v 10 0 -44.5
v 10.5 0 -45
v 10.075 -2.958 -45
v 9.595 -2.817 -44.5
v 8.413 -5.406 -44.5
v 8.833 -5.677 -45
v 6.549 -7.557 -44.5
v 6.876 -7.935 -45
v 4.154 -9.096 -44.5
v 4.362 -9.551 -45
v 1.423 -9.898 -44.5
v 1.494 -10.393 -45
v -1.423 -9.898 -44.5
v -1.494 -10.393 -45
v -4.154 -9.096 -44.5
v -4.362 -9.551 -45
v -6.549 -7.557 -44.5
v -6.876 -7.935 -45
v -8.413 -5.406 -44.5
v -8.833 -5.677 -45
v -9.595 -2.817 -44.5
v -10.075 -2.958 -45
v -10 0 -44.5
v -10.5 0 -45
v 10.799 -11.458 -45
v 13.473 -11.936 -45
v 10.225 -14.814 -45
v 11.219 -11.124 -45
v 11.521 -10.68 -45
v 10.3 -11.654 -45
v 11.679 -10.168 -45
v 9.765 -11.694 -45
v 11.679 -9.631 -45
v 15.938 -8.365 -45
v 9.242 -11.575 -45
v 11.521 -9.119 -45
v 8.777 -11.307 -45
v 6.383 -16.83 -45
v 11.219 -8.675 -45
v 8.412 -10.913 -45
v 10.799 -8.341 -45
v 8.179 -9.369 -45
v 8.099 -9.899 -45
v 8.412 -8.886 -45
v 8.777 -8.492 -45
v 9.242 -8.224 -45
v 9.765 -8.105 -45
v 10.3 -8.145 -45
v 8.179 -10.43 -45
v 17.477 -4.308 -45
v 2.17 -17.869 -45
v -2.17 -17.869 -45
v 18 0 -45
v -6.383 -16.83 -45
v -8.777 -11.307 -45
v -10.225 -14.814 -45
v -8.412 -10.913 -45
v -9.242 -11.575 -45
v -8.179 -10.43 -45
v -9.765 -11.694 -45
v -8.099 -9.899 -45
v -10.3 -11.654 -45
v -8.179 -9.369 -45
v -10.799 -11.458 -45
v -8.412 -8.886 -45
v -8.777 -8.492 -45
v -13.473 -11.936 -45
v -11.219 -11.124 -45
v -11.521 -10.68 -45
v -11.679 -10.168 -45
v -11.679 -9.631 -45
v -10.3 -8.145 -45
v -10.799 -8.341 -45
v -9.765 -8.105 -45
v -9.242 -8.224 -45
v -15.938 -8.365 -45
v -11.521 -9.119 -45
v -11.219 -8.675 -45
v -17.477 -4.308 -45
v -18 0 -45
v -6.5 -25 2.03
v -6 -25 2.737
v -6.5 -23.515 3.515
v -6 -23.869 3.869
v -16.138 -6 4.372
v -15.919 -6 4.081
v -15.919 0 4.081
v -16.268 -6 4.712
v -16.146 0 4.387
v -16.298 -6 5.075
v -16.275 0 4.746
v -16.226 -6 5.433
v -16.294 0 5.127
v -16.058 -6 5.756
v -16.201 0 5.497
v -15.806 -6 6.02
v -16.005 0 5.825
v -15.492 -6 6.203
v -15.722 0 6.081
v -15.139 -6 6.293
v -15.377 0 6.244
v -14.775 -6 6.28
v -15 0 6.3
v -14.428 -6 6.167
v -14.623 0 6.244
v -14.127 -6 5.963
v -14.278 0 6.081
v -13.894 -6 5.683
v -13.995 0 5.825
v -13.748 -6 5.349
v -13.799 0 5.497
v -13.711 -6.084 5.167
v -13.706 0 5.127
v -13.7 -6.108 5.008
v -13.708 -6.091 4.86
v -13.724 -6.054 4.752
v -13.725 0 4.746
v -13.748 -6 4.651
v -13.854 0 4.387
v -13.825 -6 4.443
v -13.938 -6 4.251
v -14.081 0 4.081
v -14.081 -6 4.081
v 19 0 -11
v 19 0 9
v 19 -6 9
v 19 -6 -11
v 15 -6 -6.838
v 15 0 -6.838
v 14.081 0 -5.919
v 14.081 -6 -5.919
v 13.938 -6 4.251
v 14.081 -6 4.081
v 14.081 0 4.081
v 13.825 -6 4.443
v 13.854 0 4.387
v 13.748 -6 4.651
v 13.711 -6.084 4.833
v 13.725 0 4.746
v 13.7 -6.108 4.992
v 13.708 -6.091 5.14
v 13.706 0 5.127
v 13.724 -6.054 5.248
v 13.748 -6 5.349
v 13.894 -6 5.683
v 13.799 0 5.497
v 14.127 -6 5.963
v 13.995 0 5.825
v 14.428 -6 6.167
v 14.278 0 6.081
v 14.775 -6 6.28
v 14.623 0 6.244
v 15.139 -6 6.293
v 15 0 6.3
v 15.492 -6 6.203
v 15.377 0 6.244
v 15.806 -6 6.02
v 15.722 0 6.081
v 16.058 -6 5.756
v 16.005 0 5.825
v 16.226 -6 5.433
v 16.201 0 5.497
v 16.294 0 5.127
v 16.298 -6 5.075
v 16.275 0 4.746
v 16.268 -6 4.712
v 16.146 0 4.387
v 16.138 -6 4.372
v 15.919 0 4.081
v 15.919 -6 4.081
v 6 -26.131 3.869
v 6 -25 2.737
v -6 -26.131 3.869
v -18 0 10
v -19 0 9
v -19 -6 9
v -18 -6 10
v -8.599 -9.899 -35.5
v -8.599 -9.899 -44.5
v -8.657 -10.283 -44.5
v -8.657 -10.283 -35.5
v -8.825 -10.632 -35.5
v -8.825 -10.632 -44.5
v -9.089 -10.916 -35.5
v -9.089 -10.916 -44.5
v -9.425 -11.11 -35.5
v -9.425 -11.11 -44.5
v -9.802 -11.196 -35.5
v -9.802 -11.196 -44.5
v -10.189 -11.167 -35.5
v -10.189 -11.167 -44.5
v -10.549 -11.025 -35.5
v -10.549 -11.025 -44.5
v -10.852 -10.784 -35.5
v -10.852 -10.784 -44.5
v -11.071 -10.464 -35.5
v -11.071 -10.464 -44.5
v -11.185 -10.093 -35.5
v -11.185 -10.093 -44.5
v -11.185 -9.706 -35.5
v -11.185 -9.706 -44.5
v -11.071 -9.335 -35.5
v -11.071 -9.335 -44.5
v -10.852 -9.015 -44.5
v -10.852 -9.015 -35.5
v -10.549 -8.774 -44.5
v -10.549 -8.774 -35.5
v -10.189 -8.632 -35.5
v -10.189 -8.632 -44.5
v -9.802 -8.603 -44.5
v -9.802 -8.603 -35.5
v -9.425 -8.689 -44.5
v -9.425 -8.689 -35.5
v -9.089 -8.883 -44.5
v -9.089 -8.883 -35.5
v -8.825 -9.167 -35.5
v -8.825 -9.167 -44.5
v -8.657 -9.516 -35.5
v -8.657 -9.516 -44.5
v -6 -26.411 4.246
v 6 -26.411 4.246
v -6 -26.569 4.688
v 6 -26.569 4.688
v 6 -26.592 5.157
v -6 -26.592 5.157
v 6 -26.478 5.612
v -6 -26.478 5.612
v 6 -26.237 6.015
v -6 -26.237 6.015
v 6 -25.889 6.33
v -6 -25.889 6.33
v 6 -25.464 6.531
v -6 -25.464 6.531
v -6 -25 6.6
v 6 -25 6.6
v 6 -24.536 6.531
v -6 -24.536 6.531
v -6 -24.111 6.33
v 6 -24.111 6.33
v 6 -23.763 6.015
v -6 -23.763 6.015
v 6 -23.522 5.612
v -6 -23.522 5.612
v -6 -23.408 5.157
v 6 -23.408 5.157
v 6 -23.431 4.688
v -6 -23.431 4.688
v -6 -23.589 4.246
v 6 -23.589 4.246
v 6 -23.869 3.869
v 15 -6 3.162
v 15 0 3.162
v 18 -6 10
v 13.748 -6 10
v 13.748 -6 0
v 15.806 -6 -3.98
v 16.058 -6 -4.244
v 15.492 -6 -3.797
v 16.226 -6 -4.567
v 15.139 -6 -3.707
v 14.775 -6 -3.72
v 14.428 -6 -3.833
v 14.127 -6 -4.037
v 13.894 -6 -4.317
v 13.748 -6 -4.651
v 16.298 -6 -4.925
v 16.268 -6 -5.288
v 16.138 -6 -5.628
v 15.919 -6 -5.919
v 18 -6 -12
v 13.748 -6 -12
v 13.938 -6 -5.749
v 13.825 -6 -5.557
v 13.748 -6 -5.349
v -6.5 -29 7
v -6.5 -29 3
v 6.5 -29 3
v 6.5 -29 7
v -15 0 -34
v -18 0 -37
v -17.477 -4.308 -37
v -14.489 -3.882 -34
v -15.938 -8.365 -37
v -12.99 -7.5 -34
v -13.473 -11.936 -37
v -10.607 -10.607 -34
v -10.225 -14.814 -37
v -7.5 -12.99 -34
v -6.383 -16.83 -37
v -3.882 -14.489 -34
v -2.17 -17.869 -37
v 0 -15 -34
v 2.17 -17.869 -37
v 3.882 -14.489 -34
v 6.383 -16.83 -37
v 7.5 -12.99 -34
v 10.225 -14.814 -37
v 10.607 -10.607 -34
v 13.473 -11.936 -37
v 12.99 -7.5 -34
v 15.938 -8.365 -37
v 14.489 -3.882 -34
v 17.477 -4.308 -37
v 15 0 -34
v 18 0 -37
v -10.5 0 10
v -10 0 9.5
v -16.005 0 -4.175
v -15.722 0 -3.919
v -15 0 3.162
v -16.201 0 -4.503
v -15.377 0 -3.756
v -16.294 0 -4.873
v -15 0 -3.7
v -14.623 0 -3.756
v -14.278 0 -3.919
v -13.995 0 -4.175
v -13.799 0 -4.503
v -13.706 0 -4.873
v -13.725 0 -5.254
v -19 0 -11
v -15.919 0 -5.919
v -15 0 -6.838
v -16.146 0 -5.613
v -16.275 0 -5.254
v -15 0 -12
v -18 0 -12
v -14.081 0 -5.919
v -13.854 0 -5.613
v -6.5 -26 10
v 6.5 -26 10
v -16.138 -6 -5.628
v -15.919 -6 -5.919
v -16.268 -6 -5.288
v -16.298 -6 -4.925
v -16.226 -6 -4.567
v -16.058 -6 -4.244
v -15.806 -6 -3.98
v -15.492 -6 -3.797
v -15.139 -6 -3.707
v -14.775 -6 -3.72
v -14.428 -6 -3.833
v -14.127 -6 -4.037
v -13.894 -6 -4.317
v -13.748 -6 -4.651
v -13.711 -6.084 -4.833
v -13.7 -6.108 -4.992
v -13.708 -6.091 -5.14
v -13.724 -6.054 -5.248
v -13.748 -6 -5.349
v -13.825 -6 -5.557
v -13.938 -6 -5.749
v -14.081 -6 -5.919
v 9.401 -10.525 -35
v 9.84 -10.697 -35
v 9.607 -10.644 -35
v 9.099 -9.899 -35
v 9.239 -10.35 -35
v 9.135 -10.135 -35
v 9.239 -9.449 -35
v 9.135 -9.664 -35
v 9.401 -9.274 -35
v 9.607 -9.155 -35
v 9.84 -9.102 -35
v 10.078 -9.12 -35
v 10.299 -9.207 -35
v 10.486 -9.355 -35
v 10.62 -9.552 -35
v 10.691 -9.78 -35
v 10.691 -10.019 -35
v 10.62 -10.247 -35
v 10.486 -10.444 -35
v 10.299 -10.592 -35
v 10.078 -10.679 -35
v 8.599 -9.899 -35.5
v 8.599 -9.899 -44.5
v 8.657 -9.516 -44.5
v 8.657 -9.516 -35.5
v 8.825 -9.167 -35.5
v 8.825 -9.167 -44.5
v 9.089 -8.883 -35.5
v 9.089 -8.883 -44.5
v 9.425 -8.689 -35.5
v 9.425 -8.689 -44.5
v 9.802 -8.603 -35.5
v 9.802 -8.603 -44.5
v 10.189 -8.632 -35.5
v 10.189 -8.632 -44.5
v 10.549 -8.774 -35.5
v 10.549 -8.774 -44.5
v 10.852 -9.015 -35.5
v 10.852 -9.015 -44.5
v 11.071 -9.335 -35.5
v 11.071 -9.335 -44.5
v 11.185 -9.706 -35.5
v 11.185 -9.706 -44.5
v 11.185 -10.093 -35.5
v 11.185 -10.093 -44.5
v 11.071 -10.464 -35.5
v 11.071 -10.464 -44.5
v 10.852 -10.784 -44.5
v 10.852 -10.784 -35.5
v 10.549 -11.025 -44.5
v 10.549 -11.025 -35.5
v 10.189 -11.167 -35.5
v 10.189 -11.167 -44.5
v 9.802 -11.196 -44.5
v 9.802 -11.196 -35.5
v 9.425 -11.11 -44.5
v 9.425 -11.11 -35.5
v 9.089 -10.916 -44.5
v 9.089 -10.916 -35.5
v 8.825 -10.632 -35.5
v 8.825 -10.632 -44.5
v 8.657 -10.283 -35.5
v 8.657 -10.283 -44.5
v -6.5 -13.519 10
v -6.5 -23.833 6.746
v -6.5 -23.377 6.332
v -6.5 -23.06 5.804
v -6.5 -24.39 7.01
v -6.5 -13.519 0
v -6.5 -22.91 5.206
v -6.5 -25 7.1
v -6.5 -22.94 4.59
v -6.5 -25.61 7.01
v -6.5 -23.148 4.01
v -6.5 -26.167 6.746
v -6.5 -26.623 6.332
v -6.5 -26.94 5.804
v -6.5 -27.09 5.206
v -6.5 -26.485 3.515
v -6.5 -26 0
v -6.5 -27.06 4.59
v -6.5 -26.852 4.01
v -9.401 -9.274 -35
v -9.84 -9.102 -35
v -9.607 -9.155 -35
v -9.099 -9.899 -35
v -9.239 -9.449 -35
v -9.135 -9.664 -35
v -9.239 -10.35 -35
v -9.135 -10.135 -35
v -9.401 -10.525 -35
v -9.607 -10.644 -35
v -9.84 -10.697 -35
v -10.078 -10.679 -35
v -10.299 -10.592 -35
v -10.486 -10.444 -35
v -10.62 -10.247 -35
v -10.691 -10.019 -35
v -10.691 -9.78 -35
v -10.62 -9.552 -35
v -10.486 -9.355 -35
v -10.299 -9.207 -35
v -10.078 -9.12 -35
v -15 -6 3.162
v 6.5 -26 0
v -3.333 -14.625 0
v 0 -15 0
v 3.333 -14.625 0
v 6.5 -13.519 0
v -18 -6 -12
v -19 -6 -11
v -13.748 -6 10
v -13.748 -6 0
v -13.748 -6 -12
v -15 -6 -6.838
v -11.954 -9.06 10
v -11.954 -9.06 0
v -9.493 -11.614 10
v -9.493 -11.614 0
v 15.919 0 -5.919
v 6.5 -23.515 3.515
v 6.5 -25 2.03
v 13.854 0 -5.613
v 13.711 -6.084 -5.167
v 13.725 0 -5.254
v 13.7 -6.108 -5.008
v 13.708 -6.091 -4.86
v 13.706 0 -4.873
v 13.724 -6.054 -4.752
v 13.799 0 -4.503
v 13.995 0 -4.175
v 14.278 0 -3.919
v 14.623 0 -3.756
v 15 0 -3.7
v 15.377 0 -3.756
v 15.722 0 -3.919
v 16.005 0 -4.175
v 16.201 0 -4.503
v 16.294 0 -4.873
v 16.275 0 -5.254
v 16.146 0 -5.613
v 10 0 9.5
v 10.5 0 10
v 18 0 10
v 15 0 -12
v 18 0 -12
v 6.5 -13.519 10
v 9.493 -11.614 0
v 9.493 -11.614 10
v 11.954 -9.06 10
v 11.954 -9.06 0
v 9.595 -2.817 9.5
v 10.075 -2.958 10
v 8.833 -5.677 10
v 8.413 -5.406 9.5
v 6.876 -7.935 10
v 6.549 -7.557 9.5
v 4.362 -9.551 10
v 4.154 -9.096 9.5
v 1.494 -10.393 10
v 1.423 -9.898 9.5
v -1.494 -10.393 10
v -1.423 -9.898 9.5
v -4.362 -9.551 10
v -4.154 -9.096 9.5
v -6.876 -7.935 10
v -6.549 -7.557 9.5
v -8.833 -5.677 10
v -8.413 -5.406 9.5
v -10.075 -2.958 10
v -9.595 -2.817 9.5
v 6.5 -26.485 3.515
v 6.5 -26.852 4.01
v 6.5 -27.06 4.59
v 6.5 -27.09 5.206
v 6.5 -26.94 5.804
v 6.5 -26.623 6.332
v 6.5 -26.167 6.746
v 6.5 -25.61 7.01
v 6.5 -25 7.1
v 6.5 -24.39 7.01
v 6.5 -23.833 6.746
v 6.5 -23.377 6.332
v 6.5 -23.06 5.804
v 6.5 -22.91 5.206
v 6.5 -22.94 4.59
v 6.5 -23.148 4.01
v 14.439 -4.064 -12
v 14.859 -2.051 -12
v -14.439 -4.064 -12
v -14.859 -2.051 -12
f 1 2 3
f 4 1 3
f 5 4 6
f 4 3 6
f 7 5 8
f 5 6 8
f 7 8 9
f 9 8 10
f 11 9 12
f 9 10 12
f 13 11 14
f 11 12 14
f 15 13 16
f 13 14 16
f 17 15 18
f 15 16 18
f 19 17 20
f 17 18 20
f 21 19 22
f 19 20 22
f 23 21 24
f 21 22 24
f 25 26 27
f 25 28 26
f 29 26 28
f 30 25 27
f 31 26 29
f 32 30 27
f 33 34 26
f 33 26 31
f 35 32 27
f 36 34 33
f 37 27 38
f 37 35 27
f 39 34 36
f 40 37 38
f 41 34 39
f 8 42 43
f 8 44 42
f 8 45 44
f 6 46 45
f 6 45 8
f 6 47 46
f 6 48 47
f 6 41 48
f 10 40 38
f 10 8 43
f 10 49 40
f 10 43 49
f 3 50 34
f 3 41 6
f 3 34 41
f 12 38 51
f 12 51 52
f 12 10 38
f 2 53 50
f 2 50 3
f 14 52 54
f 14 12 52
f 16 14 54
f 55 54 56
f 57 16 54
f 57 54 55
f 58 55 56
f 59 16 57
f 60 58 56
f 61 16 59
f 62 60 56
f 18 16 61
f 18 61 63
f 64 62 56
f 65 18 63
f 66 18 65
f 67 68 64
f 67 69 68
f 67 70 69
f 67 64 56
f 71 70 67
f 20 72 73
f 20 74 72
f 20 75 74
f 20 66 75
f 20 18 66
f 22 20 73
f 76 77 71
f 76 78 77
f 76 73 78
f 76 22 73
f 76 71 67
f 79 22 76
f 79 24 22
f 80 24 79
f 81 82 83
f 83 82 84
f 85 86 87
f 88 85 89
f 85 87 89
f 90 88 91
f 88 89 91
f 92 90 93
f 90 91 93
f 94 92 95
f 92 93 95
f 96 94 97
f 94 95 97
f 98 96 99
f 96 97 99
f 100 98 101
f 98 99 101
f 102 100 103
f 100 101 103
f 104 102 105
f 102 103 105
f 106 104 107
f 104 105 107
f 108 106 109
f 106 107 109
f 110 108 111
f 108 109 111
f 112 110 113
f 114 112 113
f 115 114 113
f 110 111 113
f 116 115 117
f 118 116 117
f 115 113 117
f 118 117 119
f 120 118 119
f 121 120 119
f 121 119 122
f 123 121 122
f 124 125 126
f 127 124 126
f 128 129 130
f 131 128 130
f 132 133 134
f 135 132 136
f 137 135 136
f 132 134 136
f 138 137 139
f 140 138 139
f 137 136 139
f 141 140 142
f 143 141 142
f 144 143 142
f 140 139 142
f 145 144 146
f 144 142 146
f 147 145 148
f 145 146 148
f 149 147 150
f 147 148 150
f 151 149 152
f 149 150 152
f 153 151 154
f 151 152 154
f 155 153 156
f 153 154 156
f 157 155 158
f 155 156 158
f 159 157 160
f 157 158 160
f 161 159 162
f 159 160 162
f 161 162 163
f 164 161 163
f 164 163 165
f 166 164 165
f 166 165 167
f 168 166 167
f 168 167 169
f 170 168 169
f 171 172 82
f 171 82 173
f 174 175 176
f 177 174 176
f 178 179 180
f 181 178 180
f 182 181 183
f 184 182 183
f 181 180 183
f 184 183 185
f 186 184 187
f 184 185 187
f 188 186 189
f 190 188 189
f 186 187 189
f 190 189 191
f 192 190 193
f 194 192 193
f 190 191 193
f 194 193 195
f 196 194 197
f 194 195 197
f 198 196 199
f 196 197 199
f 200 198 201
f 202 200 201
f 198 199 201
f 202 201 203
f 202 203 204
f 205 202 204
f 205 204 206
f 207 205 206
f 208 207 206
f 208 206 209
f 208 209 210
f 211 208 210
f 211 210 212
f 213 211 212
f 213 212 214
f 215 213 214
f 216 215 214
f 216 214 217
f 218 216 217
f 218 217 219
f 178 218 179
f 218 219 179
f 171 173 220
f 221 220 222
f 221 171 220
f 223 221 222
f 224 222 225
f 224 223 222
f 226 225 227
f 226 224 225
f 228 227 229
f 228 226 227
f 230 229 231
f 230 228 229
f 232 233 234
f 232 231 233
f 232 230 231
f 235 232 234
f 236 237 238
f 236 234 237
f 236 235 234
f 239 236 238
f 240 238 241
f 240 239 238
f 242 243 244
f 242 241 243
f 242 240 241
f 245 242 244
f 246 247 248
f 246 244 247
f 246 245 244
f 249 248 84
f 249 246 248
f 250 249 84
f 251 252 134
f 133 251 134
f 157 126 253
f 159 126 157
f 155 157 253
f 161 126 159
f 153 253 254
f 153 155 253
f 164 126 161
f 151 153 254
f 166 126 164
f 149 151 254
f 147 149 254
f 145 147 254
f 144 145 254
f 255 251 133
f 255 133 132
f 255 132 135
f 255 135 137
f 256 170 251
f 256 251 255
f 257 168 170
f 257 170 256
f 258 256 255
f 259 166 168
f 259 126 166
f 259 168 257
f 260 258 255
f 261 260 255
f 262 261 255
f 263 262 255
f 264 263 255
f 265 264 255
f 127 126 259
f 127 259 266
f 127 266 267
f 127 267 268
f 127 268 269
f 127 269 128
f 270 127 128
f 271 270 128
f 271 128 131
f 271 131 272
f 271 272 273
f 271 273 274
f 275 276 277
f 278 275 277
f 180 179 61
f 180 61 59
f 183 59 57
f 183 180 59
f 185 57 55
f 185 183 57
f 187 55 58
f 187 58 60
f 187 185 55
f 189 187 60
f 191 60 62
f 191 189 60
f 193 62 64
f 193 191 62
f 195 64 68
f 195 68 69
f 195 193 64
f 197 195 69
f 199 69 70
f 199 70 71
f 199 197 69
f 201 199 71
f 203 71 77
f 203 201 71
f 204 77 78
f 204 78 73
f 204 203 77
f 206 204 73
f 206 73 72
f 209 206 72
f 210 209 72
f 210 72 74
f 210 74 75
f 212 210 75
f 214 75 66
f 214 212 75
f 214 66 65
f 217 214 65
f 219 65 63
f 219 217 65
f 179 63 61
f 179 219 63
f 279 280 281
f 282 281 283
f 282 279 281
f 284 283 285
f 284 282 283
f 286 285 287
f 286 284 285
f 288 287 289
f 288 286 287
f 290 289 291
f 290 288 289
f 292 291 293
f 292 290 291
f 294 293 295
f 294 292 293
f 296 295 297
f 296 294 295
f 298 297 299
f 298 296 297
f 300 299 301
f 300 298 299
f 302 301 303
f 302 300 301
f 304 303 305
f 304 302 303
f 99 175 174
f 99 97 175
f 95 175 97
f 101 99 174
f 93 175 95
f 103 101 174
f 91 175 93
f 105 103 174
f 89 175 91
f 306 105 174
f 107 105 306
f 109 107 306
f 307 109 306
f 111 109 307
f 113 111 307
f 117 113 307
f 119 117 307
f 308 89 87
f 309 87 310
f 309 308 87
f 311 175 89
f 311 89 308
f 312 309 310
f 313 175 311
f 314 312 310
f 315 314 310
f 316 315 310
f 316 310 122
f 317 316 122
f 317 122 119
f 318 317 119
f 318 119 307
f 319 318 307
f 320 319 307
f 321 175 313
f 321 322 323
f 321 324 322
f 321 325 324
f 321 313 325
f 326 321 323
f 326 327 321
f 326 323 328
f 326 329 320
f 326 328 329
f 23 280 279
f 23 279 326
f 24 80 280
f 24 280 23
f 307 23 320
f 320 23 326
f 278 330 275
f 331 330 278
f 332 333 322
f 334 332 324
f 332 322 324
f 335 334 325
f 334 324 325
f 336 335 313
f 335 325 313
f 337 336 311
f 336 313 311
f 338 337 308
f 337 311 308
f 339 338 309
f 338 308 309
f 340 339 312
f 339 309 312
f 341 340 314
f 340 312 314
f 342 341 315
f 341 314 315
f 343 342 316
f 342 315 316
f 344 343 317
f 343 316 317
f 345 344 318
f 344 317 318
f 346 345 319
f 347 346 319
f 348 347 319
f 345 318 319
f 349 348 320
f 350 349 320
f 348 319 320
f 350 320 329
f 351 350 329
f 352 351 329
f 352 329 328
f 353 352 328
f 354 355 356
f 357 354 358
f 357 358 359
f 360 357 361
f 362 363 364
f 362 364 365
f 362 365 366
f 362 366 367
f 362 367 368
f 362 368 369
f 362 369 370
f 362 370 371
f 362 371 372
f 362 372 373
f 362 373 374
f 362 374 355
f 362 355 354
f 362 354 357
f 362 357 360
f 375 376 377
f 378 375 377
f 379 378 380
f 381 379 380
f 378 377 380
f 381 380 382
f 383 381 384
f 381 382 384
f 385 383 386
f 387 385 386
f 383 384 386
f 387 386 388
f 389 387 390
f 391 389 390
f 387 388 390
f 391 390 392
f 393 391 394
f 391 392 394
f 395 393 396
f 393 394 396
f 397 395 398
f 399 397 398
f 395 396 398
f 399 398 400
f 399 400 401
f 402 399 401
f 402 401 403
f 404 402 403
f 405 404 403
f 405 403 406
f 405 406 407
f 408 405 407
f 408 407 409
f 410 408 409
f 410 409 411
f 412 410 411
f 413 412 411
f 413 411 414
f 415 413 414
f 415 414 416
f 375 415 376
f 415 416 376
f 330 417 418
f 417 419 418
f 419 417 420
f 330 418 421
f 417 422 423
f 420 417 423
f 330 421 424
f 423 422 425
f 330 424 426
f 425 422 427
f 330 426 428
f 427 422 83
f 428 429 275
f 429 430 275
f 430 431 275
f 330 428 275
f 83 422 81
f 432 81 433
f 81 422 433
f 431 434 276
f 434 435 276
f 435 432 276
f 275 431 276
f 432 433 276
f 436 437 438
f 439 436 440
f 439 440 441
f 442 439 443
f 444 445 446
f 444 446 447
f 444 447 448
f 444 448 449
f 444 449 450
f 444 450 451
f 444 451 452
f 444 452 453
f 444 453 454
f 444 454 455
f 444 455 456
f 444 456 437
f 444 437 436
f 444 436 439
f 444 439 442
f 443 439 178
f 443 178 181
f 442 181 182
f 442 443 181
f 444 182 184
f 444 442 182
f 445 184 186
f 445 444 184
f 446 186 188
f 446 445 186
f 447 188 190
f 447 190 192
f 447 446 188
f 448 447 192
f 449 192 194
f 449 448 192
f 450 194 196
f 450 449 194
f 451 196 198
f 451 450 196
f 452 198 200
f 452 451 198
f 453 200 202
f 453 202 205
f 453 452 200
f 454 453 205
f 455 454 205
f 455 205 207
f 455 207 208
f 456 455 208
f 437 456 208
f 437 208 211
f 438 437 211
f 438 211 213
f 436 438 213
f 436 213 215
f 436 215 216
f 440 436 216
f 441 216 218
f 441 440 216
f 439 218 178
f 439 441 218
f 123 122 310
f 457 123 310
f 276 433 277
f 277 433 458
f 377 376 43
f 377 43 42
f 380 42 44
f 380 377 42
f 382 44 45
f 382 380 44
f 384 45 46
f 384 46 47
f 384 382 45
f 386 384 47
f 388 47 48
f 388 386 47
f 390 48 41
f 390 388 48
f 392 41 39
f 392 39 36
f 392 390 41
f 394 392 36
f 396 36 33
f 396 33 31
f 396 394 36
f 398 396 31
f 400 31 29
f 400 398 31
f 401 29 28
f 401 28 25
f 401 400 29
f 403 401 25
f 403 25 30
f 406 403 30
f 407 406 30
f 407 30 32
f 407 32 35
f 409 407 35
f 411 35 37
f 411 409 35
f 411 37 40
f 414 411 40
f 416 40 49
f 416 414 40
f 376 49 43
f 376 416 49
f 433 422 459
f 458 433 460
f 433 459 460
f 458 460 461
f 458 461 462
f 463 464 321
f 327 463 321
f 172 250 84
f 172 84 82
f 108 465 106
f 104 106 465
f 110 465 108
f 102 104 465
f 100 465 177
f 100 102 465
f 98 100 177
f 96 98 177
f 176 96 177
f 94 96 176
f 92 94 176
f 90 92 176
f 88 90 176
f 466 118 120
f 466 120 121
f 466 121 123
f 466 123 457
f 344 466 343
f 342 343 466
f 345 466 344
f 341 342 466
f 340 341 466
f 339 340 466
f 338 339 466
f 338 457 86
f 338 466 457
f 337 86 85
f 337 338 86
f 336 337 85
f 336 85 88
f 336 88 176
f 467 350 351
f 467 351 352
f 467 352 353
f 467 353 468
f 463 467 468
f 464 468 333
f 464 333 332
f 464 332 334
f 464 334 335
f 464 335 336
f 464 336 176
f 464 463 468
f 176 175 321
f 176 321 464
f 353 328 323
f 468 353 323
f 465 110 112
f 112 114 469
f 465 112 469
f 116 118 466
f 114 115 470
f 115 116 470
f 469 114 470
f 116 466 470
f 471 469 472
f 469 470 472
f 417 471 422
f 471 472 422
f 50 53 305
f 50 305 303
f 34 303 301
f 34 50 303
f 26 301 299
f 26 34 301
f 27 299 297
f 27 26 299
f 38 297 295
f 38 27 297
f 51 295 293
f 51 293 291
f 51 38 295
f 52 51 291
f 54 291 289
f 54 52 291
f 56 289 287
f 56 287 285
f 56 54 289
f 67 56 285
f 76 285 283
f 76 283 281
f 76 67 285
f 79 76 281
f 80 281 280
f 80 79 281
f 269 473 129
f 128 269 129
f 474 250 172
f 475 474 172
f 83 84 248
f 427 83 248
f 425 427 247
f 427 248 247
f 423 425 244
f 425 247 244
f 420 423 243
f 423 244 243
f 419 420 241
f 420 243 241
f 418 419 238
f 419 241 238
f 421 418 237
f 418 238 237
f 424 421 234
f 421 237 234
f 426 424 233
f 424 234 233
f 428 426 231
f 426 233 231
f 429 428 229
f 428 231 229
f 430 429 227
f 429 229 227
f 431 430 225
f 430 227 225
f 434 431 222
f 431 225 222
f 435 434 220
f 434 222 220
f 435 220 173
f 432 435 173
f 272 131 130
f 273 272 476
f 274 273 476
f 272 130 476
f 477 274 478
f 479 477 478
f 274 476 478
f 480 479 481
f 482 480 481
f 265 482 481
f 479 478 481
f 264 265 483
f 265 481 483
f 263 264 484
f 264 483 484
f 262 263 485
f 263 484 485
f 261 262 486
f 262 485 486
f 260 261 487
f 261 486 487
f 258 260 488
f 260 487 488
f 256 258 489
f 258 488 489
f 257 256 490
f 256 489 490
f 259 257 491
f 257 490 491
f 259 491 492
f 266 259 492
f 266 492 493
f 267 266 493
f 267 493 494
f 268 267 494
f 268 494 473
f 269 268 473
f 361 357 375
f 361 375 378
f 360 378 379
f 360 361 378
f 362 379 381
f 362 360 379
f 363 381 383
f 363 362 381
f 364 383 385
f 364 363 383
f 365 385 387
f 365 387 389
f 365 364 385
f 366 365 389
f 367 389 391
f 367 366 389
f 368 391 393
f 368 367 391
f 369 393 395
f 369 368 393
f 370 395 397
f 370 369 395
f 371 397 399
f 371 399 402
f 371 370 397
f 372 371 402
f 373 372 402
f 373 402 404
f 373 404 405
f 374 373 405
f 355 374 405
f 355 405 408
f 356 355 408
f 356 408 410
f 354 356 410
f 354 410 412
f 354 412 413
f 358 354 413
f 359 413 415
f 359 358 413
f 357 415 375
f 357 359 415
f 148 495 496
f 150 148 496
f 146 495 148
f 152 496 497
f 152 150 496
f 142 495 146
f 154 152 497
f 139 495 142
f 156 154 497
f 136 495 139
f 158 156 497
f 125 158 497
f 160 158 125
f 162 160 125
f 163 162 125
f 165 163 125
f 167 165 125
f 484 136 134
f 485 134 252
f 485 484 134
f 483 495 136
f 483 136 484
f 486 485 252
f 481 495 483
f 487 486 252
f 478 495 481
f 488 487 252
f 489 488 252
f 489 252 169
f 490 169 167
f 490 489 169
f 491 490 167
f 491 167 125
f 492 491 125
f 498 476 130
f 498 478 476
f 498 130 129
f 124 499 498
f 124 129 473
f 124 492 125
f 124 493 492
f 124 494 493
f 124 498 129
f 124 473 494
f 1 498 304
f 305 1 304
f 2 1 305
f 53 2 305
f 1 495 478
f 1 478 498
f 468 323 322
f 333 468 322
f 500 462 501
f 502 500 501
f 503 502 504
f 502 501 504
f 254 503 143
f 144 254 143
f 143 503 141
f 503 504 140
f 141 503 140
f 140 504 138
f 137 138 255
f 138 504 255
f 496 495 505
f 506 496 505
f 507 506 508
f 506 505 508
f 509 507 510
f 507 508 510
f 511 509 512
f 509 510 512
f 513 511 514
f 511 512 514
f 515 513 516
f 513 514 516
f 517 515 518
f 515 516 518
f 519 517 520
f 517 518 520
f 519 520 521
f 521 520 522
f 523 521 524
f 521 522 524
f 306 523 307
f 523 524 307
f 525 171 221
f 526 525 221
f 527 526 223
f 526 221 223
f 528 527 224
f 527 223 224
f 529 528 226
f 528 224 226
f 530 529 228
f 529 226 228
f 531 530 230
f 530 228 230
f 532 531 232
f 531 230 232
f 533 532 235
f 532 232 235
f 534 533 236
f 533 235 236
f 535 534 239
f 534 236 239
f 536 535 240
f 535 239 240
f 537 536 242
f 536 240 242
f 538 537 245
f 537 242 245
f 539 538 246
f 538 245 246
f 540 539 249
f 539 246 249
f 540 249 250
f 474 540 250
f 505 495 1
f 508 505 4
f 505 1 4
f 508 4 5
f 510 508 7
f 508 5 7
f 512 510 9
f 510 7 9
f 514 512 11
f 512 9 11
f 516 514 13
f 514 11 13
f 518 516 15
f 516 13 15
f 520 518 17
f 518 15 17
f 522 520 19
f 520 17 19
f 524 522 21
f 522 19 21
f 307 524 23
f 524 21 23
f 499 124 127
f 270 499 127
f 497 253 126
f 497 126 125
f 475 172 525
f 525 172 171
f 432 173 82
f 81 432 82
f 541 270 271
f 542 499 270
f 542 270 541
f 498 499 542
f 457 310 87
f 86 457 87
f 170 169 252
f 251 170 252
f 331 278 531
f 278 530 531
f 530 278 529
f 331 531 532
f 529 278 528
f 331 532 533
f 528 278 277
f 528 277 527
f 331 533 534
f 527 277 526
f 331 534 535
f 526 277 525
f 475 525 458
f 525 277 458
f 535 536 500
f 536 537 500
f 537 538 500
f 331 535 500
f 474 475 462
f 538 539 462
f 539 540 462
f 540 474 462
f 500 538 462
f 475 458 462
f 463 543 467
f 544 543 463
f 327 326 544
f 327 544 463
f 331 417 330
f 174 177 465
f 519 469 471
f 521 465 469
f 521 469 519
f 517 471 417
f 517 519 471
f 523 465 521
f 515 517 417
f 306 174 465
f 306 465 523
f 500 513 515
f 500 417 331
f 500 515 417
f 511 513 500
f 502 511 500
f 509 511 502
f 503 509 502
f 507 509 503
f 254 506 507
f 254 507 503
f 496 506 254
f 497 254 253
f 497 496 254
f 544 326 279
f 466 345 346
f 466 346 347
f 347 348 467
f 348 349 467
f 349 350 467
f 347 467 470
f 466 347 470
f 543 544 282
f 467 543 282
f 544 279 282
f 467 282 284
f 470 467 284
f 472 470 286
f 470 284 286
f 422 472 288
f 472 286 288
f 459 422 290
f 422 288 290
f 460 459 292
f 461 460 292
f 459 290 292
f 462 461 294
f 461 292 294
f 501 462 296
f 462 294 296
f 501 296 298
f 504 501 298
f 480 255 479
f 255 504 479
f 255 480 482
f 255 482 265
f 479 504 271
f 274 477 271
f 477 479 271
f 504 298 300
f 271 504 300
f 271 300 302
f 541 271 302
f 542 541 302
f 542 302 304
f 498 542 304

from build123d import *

# Parameters (mm, degrees)
EXTRUDE_1_DEPTH     = 10
CUT_EXTRUDE_1_DEPTH = 54
CUT_EXTRUDE_2_DEPTH = 54
EXTRUDE_START       = 45
EXTRUDE_2_DEPTH     = 45
CHAMFER_1_SIZE      = 3
EXTRUDE_START_2     = 12
EXTRUDE_3_DEPTH     = 12
CUT_EXTRUDE_4_DEPTH = 12
EXTRUDE_4_DEPTH     = 8
CHAMFER_7_SIZE      = 3
SKETCH_7_R          = 1.3
CUT_EXTRUDE_3_DEPTH = 10
CHAMFER_4_SIZE      = 1
CHAMFER_5_SIZE      = 0.5
CHAMFER_6_SIZE      = 0.5


with BuildPart() as part:
    # 草图1 → 凸台-拉伸1 (new body)
    with BuildSketch(Plane.XY):
        with BuildLine():
            Line((-10, 0), (-19, 0))
            Line((-19, 0), (-19, -6))
            Line((-19, -6), (-13.747727085, -6))
            ThreePointArc((-13.747727085, -6), (-10.799286806, -10.410350834), (-6.5, -13.518505835))
            Line((-6.5, -13.518505835), (-6.5, -29))
            Line((-6.5, -29), (6.5, -29))
            Line((6.5, -29), (6.5, -13.518505835))
            ThreePointArc((6.5, -13.518505835), (10.799286806, -10.410350834), (13.747727085, -6))
            Line((13.747727085, -6), (19, -6))
            Line((19, -6), (19, 0))
            Line((19, 0), (10, 0))
            ThreePointArc((10, 0), (0, -10), (-10, 0))
        make_face()
    extrude(amount=EXTRUDE_1_DEPTH)

    # 草图3 → 切除-拉伸1 (cut)
    with BuildSketch(Plane(origin=(6.5, 0, 0), x_dir=(0, 0, -1), z_dir=(1, 0, 0))):
        with BuildLine():
            Line((-3.86862915, -23.86862915), (-2.7372583, -25))
            Line((-2.7372583, -25), (-3.86862915, -26.13137085))
            ThreePointArc((-3.86862915, -26.13137085), (-6.6, -25), (-3.86862915, -23.86862915))
        make_face()
    extrude(amount=-CUT_EXTRUDE_1_DEPTH, mode=Mode.SUBTRACT)

    # 草图4 → 切除-拉伸2 (cut)
    with BuildSketch(Plane(origin=(0, 0, 0), x_dir=(1, 0, 0), z_dir=(0, 1, 0))):
        with BuildLine():
            Line((-15, -3.161522369), (-15.919238816, -4.080761184))
            ThreePointArc((-15.919238816, -4.080761184), (-15, -6.3), (-14.080761184, -4.080761184))
            Line((-14.080761184, -4.080761184), (-15, -3.161522369))
        make_face()
        with BuildLine():
            Line((15, -3.161522369), (14.080761184, -4.080761184))
            ThreePointArc((14.080761184, -4.080761184), (15, -6.3), (15.919238816, -4.080761184))
            Line((15.919238816, -4.080761184), (15, -3.161522369))
        make_face()
    extrude(amount=-CUT_EXTRUDE_2_DEPTH, mode=Mode.SUBTRACT)

    # 草图5 → 凸台-拉伸2 (add)
    with BuildSketch(Plane(origin=(0, 0, 0), x_dir=(-1, 0, 0), z_dir=(0, 0, -1)).offset(EXTRUDE_START)):
        with BuildLine():
            Line((10, 0), (15, 0))
            ThreePointArc((15, 0), (0, -15), (-15, 0))
            Line((-15, 0), (-10, 0))
            ThreePointArc((-10, 0), (0, -10), (10, 0))
        make_face()
    extrude(amount=-EXTRUDE_2_DEPTH)

    # 倒角1
    chamfer_1_edges = [part.edges().sort_by_distance(p)[0] for p in [
        (0, -29, 0),
        (0, -29, 10),
    ]]
    chamfer(chamfer_1_edges, length=CHAMFER_1_SIZE)

    # 草图8 → 凸台-拉伸3 (add)
    with BuildSketch(Plane(origin=(0, 0, 0), x_dir=(-1, 0, 0), z_dir=(0, 0, -1)).offset(EXTRUDE_START_2)):
        with BuildLine():
            Line((-15, 0), (-19, 0))
            Line((-19, 0), (-19, -6))
            Line((-19, -6), (-13.747727085, -6))
            ThreePointArc((-13.747727085, -6), (-14.683594694, -3.064644655), (-15, 0))
        make_face()
        with BuildLine():
            Line((13.747727085, -6), (19, -6))
            Line((19, -6), (19, 0))
            Line((19, 0), (15, 0))
            ThreePointArc((15, 0), (14.683594694, -3.064644655), (13.747727085, -6))
        make_face()
    extrude(amount=-EXTRUDE_3_DEPTH)

    # 草图9 → 切除-拉伸4 (cut)
    with BuildSketch(Plane(origin=(0, 0, 0), x_dir=(1, 0, 0), z_dir=(0, 1, 0))):
        with BuildLine():
            Line((15, 6.838477631), (14.080761184, 5.919238816))
            ThreePointArc((14.080761184, 5.919238816), (15, 3.7), (15.919238816, 5.919238816))
            Line((15.919238816, 5.919238816), (15, 6.838477631))
        make_face()
        with BuildLine():
            Line((-15, 6.838477631), (-15.919238816, 5.919238816))
            ThreePointArc((-15.919238816, 5.919238816), (-15, 3.7), (-14.080761184, 5.919238816))
            Line((-14.080761184, 5.919238816), (-15, 6.838477631))
        make_face()
    extrude(amount=-CUT_EXTRUDE_4_DEPTH, mode=Mode.SUBTRACT)

    # 草图10 → 凸台-拉伸4 (add)
    with BuildSketch(Plane(origin=(0, 0, -45), x_dir=(-1, 0, 0), z_dir=(0, 0, -1))):
        with BuildLine():
            Line((-15, 0), (-18, 0))
            ThreePointArc((-18, 0), (0, -18), (18, 0))
            Line((18, 0), (15, 0))
            ThreePointArc((15, 0), (0, -15), (-15, 0))
        make_face()
    extrude(amount=-EXTRUDE_4_DEPTH)

    # 倒角7
    chamfer_7_edges = [part.edges().sort_by_distance(p)[0] for p in [
        (0, -15, -37),
    ]]
    chamfer(chamfer_7_edges, length=CHAMFER_7_SIZE - 0.0001)  # a hair under: the kernel refuses the full size

    # 草图7 → 切除-拉伸3 (cut)
    with BuildSketch(Plane(origin=(0, 0, -45), x_dir=(-1, 0, 0), z_dir=(0, 0, -1))):
        with Locations((-9.899494937, -9.899494937)):
            Circle(SKETCH_7_R)
        with Locations(Location((9.899494937, -9.899494937, 0), (0, 0, 180))):
            Circle(SKETCH_7_R)
    extrude(amount=-CUT_EXTRUDE_3_DEPTH, mode=Mode.SUBTRACT)

    # 倒角4
    chamfer_4_edges = [part.edges().sort_by_distance(p)[0] for p in [
        (-19, -3, 10),
        (19, -3, -12),
        (-19, -3, -12),
        (19, -3, 10),
    ]]
    chamfer(chamfer_4_edges, length=CHAMFER_4_SIZE)

    # 倒角5
    chamfer_5_edges = [part.edges().sort_by_distance(p)[0] for p in [
        (-6.5, -25, 6.6),
        (-6.5, -24.434314575, 3.302943725),
        (-6.5, -25.565685425, 3.302943725),
        (6.5, -25, 6.6),
        (6.5, -25.565685425, 3.302943725),
        (6.5, -24.434314575, 3.302943725),
        (0, -10, 10),
        (0, -10, -45),
    ]]
    chamfer(chamfer_5_edges, length=CHAMFER_5_SIZE)

    # 倒角6
    chamfer_6_edges = [part.edges().sort_by_distance(p)[0] for p in [
        (11.199494937, -9.899494937, -35),
        (11.199494937, -9.899494937, -45),
        (-11.199494937, -9.899494937, -35),
        (-11.199494937, -9.899494937, -45),
    ]]
    chamfer(chamfer_6_edges, length=CHAMFER_6_SIZE)


solid = part.part
